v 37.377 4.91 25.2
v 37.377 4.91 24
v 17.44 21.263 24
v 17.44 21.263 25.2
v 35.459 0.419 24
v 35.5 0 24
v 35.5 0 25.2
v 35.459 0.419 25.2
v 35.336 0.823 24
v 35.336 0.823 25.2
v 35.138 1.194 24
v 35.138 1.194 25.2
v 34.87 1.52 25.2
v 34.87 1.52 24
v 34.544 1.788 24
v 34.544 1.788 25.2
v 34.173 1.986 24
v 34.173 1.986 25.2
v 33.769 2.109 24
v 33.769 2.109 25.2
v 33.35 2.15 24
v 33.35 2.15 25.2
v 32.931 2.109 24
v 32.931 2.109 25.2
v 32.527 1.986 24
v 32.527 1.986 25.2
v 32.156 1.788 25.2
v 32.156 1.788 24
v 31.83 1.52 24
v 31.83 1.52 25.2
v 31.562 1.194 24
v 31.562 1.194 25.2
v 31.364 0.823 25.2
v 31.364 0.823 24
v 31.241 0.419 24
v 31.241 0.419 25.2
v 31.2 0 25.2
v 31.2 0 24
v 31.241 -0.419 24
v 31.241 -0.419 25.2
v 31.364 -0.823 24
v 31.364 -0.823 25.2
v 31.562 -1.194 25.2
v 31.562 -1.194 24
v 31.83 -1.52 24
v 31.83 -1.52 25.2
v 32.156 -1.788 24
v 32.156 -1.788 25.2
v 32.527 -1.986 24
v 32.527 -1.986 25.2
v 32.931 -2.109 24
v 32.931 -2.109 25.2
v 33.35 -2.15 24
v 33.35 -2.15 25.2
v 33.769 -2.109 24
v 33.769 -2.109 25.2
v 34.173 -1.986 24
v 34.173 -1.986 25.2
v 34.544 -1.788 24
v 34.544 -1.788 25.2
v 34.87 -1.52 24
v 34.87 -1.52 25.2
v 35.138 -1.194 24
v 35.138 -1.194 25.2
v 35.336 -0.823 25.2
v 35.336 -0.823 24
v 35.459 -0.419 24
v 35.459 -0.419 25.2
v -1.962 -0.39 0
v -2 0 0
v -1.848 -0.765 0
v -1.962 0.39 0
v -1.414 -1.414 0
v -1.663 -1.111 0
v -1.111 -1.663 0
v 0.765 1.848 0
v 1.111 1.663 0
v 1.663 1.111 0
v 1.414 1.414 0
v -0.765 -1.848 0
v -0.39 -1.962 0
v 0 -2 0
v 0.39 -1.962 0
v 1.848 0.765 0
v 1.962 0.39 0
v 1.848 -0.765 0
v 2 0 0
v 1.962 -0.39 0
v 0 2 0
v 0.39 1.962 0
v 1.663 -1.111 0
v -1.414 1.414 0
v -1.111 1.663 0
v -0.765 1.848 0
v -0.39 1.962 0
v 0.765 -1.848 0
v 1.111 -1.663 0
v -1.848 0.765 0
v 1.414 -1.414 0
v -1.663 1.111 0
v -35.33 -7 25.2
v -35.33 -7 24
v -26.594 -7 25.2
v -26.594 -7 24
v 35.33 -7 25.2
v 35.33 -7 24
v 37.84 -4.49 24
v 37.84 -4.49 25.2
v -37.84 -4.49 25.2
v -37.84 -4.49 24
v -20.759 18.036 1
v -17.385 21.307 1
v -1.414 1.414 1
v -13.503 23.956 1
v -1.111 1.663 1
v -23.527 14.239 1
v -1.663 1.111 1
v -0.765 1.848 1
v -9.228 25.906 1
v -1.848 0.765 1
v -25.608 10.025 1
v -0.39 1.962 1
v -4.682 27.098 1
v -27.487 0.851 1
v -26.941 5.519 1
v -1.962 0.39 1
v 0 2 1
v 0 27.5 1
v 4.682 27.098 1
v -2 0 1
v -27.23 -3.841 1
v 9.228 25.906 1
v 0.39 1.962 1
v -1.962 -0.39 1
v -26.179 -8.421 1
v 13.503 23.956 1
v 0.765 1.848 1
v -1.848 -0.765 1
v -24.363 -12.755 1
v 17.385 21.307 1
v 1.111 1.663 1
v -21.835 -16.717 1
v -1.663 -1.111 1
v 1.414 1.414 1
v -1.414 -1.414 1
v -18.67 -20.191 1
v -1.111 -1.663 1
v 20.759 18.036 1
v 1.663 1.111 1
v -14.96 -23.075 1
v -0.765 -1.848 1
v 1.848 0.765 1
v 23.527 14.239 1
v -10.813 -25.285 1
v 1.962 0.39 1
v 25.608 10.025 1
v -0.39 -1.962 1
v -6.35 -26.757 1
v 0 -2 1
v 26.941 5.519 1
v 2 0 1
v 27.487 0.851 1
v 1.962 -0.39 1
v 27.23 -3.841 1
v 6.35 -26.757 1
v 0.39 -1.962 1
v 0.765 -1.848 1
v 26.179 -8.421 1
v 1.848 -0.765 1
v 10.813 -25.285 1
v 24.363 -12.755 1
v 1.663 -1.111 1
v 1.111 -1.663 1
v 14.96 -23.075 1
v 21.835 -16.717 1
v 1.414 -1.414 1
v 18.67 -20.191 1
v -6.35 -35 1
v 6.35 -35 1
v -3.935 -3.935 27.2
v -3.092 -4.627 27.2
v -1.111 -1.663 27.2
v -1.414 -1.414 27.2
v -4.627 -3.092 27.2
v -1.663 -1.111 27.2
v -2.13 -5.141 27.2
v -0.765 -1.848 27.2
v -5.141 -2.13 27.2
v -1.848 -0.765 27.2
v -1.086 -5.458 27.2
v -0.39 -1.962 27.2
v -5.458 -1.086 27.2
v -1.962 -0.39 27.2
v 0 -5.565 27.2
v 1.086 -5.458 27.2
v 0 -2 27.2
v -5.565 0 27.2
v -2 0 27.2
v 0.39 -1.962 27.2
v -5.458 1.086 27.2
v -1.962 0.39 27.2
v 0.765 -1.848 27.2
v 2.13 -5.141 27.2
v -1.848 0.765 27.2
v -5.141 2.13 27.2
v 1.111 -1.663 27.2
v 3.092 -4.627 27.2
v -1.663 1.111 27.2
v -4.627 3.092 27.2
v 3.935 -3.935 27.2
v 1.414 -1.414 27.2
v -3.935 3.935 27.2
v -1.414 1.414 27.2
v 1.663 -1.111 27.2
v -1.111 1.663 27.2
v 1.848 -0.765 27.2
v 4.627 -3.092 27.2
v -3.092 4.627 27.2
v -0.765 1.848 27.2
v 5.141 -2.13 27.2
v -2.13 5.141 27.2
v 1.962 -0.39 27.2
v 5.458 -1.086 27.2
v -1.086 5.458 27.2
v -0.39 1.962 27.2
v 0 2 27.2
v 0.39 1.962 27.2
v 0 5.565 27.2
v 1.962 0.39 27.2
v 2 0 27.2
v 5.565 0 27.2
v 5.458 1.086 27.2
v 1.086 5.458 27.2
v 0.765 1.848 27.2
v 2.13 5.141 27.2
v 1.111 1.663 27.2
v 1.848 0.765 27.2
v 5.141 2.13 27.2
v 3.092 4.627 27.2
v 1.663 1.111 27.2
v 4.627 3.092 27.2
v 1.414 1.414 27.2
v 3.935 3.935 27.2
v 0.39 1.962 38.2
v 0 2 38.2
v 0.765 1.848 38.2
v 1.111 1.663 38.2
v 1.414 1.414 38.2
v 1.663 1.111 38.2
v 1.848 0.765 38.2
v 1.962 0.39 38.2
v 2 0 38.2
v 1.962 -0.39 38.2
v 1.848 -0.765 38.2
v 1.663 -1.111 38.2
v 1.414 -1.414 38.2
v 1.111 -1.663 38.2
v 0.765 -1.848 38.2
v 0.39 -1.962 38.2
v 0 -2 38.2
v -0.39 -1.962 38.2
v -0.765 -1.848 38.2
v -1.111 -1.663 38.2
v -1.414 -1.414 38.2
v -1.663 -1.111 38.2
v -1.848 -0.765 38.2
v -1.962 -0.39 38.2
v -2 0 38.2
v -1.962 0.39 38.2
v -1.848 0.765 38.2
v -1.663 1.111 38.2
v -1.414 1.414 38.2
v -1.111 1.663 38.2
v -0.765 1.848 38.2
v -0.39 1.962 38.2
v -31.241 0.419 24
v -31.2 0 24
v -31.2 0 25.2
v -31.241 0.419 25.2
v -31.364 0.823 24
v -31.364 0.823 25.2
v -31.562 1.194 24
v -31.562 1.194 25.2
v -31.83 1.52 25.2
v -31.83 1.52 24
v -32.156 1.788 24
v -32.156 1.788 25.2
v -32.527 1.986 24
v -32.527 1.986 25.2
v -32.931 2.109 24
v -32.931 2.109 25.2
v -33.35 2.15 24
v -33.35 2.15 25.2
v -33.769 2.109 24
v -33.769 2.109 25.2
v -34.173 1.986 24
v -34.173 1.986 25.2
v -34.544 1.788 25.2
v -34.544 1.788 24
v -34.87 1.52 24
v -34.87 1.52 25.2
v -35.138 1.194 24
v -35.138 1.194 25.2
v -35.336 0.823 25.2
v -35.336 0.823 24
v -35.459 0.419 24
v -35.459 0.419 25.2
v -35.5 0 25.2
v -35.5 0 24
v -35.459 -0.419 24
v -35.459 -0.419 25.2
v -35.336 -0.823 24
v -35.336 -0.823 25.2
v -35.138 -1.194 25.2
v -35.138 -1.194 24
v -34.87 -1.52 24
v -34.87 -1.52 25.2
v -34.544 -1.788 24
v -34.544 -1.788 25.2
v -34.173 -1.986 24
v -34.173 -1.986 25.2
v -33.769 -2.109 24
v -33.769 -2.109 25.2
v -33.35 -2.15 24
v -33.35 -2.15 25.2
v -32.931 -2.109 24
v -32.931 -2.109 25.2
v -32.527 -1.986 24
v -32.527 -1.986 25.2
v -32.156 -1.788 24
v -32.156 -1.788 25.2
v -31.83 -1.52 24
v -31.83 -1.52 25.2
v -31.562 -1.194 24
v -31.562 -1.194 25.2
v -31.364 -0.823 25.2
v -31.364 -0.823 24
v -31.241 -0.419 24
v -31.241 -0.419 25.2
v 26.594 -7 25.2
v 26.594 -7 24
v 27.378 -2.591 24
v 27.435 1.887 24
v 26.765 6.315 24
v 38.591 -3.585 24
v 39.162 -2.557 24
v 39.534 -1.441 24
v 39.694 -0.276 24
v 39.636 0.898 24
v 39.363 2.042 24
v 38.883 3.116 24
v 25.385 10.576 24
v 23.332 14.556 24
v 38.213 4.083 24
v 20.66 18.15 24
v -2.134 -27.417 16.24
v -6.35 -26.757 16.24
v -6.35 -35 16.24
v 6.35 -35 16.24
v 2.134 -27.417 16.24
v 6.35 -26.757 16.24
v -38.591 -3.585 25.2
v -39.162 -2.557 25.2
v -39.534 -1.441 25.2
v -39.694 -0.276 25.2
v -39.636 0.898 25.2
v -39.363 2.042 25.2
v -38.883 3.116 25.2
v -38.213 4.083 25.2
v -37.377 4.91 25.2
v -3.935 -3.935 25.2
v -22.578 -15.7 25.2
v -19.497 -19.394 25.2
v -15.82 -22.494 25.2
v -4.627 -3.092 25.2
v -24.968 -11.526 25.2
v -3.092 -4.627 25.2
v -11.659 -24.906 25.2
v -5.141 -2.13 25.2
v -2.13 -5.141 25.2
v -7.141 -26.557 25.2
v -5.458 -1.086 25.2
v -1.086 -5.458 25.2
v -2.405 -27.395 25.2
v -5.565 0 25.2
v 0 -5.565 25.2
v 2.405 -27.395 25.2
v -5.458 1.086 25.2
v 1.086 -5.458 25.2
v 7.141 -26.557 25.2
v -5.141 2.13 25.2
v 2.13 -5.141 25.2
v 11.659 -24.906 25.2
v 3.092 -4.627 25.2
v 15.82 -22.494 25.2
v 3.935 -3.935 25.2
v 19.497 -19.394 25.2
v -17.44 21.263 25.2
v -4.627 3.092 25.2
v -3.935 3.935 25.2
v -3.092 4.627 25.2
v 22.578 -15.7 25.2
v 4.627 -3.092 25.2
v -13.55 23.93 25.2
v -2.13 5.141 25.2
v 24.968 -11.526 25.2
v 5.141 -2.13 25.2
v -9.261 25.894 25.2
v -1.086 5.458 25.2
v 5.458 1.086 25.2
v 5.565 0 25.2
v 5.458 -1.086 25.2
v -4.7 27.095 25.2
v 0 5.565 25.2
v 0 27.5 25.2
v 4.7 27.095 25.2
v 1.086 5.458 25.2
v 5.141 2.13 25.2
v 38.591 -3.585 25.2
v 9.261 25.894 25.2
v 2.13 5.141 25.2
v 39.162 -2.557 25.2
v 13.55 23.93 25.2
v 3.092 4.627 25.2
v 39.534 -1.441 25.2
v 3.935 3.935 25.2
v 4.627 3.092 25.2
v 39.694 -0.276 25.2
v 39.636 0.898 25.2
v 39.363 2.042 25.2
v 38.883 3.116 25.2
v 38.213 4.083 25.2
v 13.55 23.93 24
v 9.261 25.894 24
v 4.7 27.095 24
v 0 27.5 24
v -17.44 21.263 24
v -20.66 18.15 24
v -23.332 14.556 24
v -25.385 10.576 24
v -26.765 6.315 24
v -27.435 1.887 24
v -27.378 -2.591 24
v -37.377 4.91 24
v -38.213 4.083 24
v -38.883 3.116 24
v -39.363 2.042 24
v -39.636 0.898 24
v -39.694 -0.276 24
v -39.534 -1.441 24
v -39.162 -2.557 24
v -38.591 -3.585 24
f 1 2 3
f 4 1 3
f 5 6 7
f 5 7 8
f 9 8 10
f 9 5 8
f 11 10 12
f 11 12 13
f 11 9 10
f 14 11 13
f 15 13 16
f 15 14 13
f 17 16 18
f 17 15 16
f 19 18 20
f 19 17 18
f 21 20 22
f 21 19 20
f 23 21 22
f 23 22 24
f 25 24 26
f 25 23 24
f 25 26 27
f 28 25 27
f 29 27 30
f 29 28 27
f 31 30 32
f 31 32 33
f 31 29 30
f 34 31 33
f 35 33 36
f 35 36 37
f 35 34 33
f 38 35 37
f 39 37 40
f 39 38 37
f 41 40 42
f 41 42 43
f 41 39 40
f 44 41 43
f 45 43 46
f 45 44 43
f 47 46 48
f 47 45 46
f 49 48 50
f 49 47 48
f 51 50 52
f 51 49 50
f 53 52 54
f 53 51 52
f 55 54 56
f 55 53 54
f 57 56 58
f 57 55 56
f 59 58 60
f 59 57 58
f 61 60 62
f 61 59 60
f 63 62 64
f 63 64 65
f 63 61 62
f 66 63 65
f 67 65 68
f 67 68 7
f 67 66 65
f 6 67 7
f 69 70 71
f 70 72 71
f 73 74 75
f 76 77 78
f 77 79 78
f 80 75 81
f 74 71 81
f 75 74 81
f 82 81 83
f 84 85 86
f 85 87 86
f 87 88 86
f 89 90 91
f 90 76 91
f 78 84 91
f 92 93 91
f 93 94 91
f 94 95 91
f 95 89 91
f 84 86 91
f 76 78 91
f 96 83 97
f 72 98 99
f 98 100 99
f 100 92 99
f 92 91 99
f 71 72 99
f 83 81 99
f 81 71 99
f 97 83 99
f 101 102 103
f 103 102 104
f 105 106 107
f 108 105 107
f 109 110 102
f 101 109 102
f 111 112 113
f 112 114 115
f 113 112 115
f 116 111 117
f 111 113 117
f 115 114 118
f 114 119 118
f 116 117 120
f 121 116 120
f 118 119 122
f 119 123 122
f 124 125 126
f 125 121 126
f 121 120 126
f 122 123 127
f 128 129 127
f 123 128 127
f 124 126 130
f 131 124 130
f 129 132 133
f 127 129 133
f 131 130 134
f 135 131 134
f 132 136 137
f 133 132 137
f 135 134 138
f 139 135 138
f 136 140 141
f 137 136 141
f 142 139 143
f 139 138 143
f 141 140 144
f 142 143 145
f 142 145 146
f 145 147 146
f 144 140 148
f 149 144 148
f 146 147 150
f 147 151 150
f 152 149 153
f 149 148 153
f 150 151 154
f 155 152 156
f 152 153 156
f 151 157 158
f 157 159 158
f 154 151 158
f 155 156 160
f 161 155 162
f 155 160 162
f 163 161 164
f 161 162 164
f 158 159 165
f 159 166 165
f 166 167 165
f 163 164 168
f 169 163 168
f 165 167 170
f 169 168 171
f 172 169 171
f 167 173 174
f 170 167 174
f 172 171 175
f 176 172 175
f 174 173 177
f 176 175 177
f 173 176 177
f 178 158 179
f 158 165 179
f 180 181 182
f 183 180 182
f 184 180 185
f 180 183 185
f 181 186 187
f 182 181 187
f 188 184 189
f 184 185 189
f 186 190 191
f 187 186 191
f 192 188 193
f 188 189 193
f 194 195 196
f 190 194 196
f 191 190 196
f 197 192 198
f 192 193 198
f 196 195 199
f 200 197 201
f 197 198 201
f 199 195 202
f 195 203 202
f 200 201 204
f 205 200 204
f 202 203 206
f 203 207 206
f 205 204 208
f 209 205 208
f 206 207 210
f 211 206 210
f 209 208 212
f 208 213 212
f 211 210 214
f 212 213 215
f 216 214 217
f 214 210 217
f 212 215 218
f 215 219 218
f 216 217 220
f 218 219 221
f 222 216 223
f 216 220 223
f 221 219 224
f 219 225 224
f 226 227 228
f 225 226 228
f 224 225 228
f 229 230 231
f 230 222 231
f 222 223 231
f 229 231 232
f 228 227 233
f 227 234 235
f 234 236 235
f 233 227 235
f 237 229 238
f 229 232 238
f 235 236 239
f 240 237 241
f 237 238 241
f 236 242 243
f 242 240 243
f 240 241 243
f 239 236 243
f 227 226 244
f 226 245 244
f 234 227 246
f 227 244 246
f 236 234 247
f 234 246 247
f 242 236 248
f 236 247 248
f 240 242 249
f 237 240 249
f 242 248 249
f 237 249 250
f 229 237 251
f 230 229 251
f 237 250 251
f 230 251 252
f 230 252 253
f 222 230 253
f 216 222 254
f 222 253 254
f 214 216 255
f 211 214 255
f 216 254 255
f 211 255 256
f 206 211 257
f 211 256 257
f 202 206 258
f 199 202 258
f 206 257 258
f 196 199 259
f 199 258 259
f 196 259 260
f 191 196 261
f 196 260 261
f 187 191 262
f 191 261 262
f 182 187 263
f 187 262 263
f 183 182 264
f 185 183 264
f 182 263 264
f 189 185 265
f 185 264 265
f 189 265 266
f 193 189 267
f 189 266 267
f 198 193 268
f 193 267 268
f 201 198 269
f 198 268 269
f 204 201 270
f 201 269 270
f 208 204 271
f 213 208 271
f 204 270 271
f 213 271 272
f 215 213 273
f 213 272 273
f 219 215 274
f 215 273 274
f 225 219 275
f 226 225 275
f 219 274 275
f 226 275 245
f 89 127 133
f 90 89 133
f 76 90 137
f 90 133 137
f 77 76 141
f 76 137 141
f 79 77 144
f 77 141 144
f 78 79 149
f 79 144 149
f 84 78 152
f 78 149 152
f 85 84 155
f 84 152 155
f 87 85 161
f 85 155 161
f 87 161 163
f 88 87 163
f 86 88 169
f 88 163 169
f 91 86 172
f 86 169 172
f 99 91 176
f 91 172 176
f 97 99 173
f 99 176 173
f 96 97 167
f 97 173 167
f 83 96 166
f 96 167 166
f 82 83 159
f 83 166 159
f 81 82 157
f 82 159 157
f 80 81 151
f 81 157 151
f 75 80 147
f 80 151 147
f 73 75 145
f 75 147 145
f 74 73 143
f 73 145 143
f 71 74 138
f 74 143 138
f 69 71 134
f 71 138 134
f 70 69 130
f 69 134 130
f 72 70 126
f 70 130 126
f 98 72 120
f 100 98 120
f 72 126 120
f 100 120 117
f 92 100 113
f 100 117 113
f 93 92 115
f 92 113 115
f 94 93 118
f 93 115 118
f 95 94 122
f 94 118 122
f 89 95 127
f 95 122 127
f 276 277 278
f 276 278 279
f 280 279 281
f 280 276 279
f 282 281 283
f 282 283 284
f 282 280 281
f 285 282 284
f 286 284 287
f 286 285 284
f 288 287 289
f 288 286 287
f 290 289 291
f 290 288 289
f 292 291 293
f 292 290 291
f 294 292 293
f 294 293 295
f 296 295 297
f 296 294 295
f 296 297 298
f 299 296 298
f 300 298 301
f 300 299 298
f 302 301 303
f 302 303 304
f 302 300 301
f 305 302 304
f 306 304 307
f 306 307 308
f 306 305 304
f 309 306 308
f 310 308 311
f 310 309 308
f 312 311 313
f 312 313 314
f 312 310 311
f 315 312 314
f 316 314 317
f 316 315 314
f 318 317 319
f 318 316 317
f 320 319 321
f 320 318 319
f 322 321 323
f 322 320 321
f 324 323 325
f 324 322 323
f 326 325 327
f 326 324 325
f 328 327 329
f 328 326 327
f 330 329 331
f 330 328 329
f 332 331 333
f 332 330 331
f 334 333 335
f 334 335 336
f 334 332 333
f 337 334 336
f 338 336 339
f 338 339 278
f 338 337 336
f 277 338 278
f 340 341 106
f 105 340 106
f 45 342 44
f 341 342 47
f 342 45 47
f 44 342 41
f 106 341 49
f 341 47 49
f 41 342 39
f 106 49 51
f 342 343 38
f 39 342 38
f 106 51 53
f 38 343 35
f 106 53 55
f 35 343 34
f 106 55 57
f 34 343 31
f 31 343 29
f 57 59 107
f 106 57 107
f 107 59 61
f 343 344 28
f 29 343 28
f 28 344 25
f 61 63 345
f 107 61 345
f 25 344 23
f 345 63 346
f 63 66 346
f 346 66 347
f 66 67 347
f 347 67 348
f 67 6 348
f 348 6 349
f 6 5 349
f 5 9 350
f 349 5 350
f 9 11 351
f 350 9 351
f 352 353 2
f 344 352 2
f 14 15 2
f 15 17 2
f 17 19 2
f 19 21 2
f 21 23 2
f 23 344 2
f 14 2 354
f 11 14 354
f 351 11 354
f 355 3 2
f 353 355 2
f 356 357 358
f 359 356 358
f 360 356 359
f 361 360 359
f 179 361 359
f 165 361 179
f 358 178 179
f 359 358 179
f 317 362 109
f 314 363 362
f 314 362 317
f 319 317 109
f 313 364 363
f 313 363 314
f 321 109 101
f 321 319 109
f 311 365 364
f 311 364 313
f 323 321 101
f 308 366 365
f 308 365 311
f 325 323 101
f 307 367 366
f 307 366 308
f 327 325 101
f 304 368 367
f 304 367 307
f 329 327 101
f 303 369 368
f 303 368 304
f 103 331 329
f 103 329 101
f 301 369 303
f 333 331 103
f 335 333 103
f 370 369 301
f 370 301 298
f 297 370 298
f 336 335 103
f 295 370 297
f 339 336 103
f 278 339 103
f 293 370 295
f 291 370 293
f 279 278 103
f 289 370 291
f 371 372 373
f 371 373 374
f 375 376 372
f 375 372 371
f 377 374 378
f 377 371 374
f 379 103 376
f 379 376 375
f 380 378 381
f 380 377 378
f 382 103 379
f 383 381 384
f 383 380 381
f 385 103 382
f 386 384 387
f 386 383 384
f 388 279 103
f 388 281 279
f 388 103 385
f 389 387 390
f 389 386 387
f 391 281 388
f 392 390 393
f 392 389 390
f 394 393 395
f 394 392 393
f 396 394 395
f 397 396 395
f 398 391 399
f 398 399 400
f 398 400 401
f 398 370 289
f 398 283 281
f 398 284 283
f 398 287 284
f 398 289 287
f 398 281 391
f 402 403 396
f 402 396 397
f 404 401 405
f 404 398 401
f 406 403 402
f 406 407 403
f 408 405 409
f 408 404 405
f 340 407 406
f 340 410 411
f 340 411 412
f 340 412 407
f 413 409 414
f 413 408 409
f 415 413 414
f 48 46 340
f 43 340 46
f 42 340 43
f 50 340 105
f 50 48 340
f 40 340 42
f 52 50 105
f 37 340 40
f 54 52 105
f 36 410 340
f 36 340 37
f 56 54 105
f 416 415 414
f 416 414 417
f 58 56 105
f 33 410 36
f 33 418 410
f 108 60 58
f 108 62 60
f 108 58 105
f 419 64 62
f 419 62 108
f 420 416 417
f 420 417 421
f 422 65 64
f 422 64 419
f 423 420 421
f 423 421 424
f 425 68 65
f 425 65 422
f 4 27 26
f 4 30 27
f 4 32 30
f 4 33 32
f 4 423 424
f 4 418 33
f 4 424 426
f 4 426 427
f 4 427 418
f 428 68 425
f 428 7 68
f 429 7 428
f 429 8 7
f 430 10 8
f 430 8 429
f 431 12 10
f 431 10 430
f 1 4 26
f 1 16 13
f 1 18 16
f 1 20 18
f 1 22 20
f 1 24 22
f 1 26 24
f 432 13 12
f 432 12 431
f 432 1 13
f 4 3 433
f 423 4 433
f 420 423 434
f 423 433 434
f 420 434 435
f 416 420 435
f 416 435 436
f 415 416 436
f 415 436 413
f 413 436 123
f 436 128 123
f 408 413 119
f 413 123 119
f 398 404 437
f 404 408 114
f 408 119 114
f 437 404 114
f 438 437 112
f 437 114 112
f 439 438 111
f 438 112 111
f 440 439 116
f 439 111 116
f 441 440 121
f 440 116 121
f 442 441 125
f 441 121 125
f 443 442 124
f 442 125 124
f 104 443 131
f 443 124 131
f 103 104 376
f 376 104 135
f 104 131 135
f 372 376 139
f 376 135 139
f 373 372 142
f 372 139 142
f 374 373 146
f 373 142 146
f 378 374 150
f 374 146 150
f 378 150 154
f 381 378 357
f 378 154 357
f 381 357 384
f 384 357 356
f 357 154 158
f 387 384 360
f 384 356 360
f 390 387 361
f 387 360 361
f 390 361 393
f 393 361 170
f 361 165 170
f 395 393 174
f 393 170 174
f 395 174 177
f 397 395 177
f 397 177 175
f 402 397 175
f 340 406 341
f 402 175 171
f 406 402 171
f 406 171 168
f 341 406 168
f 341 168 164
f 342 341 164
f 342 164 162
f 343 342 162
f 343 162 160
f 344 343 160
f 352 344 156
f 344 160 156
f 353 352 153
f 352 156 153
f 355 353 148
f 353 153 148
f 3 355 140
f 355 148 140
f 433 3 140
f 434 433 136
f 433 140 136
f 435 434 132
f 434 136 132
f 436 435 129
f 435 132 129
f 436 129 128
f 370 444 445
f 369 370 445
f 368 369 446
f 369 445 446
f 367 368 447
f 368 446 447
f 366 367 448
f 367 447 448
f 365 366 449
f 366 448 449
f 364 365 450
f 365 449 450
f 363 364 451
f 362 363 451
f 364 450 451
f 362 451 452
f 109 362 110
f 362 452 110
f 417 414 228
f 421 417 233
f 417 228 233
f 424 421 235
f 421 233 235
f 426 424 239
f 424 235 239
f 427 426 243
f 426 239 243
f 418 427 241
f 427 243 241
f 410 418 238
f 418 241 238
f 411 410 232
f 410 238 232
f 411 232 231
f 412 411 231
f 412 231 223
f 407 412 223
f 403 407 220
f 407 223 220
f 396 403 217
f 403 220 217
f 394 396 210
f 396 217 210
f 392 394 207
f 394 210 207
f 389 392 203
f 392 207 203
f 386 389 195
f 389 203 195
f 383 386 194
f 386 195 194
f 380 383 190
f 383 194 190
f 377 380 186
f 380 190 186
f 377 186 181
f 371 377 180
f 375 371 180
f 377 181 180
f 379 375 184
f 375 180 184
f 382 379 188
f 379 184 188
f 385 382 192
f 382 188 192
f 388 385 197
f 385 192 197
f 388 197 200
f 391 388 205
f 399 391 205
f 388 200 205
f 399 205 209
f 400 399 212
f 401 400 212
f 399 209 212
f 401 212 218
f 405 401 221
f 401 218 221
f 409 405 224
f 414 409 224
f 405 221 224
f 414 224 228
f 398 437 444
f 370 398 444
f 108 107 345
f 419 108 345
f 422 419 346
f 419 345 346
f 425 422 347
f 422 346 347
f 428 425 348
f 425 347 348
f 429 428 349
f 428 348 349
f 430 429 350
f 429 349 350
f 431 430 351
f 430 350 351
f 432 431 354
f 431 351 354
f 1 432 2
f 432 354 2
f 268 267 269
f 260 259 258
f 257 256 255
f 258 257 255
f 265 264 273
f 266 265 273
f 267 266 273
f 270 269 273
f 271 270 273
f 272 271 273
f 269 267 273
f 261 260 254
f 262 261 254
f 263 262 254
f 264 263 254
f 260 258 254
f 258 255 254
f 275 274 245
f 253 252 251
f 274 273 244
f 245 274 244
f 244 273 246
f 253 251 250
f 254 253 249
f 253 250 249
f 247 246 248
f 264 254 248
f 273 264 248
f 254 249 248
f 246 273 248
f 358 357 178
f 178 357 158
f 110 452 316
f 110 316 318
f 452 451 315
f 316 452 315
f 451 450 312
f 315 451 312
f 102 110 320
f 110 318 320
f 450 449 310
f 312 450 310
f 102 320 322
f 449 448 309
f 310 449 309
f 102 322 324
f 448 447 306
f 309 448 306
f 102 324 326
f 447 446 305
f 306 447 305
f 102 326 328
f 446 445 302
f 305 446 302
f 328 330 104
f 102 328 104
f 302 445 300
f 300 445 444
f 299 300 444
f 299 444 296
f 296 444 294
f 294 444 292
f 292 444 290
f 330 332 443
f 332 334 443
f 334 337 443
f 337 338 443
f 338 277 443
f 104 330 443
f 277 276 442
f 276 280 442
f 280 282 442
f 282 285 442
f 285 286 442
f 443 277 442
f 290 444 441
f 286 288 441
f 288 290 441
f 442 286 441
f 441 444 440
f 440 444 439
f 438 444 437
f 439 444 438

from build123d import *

# Parameters (mm, degrees)
SKETCH2_R           = 2.15
SKETCH2_R_2         = 5.565
BOSS_EXTRUDE1_DEPTH = 1.2
SKETCH3_W           = 12.7
SKETCH3_H           = 15.24
BOSS_EXTRUDE2_DEPTH = 35


with BuildPart() as part:
    # Sketch1 → Revolve1 (revolve)
    with BuildSketch(Plane(origin=(0, 0, 0), x_dir=(0, 0, -1), z_dir=(1, 0, 0))):
        Polygon((0, 0), (0, 2), (-1, 2), (-1, 27.5), (-24, 27.5), (-24, 5.565), (-27.2, 5.565), (-27.2, 2), (-38.2, 2), (-38.2, 0), align=None)
    revolve(axis=Axis((0, 0, 38.2), (0, 0, -1)))

    # Sketch2 → Boss-Extrude1 (add)
    with BuildSketch(Plane.XY.offset(24)):
        with BuildLine():
            Line((-17.440029985, 21.262534048), (-37.377061469, 4.909712407))
            ThreePointArc((-37.377061469, 4.909712407), (-39.692308695, 0.312442672), (-37.840128061, -4.490128061))
            Line((-37.840128061, -4.490128061), (-35.330256121, -7))
            Line((-35.330256121, -7), (-26.594172294, -7))
            ThreePointArc((-26.594172294, -7), (0, -27.5), (26.594172294, -7))
            Line((26.594172294, -7), (35.330256121, -7))
            Line((35.330256121, -7), (37.840128061, -4.490128061))
            ThreePointArc((37.840128061, -4.490128061), (39.692308695, 0.312442672), (37.377061469, 4.909712407))
            Line((37.377061469, 4.909712407), (17.440029985, 21.262534048))
            ThreePointArc((17.440029985, 21.262534048), (0, 27.5), (-17.440029985, 21.262534048))
        make_face()
        with Locations((-33.35, 0)):
            Circle(SKETCH2_R, mode=Mode.SUBTRACT)
        with Locations((33.35, 0)):
            Circle(SKETCH2_R, mode=Mode.SUBTRACT)
        Circle(SKETCH2_R_2, mode=Mode.SUBTRACT)
    extrude(amount=BOSS_EXTRUDE1_DEPTH)

    # Sketch3 → Boss-Extrude2 (add)
    with BuildSketch(Plane(origin=(0, 0, 0), x_dir=(1, 0, 0), z_dir=(0, 1, 0))):
        with Locations((0, -8.62)):
            Rectangle(SKETCH3_W, SKETCH3_H)
    extrude(amount=-BOSS_EXTRUDE2_DEPTH)


solid = part.part
